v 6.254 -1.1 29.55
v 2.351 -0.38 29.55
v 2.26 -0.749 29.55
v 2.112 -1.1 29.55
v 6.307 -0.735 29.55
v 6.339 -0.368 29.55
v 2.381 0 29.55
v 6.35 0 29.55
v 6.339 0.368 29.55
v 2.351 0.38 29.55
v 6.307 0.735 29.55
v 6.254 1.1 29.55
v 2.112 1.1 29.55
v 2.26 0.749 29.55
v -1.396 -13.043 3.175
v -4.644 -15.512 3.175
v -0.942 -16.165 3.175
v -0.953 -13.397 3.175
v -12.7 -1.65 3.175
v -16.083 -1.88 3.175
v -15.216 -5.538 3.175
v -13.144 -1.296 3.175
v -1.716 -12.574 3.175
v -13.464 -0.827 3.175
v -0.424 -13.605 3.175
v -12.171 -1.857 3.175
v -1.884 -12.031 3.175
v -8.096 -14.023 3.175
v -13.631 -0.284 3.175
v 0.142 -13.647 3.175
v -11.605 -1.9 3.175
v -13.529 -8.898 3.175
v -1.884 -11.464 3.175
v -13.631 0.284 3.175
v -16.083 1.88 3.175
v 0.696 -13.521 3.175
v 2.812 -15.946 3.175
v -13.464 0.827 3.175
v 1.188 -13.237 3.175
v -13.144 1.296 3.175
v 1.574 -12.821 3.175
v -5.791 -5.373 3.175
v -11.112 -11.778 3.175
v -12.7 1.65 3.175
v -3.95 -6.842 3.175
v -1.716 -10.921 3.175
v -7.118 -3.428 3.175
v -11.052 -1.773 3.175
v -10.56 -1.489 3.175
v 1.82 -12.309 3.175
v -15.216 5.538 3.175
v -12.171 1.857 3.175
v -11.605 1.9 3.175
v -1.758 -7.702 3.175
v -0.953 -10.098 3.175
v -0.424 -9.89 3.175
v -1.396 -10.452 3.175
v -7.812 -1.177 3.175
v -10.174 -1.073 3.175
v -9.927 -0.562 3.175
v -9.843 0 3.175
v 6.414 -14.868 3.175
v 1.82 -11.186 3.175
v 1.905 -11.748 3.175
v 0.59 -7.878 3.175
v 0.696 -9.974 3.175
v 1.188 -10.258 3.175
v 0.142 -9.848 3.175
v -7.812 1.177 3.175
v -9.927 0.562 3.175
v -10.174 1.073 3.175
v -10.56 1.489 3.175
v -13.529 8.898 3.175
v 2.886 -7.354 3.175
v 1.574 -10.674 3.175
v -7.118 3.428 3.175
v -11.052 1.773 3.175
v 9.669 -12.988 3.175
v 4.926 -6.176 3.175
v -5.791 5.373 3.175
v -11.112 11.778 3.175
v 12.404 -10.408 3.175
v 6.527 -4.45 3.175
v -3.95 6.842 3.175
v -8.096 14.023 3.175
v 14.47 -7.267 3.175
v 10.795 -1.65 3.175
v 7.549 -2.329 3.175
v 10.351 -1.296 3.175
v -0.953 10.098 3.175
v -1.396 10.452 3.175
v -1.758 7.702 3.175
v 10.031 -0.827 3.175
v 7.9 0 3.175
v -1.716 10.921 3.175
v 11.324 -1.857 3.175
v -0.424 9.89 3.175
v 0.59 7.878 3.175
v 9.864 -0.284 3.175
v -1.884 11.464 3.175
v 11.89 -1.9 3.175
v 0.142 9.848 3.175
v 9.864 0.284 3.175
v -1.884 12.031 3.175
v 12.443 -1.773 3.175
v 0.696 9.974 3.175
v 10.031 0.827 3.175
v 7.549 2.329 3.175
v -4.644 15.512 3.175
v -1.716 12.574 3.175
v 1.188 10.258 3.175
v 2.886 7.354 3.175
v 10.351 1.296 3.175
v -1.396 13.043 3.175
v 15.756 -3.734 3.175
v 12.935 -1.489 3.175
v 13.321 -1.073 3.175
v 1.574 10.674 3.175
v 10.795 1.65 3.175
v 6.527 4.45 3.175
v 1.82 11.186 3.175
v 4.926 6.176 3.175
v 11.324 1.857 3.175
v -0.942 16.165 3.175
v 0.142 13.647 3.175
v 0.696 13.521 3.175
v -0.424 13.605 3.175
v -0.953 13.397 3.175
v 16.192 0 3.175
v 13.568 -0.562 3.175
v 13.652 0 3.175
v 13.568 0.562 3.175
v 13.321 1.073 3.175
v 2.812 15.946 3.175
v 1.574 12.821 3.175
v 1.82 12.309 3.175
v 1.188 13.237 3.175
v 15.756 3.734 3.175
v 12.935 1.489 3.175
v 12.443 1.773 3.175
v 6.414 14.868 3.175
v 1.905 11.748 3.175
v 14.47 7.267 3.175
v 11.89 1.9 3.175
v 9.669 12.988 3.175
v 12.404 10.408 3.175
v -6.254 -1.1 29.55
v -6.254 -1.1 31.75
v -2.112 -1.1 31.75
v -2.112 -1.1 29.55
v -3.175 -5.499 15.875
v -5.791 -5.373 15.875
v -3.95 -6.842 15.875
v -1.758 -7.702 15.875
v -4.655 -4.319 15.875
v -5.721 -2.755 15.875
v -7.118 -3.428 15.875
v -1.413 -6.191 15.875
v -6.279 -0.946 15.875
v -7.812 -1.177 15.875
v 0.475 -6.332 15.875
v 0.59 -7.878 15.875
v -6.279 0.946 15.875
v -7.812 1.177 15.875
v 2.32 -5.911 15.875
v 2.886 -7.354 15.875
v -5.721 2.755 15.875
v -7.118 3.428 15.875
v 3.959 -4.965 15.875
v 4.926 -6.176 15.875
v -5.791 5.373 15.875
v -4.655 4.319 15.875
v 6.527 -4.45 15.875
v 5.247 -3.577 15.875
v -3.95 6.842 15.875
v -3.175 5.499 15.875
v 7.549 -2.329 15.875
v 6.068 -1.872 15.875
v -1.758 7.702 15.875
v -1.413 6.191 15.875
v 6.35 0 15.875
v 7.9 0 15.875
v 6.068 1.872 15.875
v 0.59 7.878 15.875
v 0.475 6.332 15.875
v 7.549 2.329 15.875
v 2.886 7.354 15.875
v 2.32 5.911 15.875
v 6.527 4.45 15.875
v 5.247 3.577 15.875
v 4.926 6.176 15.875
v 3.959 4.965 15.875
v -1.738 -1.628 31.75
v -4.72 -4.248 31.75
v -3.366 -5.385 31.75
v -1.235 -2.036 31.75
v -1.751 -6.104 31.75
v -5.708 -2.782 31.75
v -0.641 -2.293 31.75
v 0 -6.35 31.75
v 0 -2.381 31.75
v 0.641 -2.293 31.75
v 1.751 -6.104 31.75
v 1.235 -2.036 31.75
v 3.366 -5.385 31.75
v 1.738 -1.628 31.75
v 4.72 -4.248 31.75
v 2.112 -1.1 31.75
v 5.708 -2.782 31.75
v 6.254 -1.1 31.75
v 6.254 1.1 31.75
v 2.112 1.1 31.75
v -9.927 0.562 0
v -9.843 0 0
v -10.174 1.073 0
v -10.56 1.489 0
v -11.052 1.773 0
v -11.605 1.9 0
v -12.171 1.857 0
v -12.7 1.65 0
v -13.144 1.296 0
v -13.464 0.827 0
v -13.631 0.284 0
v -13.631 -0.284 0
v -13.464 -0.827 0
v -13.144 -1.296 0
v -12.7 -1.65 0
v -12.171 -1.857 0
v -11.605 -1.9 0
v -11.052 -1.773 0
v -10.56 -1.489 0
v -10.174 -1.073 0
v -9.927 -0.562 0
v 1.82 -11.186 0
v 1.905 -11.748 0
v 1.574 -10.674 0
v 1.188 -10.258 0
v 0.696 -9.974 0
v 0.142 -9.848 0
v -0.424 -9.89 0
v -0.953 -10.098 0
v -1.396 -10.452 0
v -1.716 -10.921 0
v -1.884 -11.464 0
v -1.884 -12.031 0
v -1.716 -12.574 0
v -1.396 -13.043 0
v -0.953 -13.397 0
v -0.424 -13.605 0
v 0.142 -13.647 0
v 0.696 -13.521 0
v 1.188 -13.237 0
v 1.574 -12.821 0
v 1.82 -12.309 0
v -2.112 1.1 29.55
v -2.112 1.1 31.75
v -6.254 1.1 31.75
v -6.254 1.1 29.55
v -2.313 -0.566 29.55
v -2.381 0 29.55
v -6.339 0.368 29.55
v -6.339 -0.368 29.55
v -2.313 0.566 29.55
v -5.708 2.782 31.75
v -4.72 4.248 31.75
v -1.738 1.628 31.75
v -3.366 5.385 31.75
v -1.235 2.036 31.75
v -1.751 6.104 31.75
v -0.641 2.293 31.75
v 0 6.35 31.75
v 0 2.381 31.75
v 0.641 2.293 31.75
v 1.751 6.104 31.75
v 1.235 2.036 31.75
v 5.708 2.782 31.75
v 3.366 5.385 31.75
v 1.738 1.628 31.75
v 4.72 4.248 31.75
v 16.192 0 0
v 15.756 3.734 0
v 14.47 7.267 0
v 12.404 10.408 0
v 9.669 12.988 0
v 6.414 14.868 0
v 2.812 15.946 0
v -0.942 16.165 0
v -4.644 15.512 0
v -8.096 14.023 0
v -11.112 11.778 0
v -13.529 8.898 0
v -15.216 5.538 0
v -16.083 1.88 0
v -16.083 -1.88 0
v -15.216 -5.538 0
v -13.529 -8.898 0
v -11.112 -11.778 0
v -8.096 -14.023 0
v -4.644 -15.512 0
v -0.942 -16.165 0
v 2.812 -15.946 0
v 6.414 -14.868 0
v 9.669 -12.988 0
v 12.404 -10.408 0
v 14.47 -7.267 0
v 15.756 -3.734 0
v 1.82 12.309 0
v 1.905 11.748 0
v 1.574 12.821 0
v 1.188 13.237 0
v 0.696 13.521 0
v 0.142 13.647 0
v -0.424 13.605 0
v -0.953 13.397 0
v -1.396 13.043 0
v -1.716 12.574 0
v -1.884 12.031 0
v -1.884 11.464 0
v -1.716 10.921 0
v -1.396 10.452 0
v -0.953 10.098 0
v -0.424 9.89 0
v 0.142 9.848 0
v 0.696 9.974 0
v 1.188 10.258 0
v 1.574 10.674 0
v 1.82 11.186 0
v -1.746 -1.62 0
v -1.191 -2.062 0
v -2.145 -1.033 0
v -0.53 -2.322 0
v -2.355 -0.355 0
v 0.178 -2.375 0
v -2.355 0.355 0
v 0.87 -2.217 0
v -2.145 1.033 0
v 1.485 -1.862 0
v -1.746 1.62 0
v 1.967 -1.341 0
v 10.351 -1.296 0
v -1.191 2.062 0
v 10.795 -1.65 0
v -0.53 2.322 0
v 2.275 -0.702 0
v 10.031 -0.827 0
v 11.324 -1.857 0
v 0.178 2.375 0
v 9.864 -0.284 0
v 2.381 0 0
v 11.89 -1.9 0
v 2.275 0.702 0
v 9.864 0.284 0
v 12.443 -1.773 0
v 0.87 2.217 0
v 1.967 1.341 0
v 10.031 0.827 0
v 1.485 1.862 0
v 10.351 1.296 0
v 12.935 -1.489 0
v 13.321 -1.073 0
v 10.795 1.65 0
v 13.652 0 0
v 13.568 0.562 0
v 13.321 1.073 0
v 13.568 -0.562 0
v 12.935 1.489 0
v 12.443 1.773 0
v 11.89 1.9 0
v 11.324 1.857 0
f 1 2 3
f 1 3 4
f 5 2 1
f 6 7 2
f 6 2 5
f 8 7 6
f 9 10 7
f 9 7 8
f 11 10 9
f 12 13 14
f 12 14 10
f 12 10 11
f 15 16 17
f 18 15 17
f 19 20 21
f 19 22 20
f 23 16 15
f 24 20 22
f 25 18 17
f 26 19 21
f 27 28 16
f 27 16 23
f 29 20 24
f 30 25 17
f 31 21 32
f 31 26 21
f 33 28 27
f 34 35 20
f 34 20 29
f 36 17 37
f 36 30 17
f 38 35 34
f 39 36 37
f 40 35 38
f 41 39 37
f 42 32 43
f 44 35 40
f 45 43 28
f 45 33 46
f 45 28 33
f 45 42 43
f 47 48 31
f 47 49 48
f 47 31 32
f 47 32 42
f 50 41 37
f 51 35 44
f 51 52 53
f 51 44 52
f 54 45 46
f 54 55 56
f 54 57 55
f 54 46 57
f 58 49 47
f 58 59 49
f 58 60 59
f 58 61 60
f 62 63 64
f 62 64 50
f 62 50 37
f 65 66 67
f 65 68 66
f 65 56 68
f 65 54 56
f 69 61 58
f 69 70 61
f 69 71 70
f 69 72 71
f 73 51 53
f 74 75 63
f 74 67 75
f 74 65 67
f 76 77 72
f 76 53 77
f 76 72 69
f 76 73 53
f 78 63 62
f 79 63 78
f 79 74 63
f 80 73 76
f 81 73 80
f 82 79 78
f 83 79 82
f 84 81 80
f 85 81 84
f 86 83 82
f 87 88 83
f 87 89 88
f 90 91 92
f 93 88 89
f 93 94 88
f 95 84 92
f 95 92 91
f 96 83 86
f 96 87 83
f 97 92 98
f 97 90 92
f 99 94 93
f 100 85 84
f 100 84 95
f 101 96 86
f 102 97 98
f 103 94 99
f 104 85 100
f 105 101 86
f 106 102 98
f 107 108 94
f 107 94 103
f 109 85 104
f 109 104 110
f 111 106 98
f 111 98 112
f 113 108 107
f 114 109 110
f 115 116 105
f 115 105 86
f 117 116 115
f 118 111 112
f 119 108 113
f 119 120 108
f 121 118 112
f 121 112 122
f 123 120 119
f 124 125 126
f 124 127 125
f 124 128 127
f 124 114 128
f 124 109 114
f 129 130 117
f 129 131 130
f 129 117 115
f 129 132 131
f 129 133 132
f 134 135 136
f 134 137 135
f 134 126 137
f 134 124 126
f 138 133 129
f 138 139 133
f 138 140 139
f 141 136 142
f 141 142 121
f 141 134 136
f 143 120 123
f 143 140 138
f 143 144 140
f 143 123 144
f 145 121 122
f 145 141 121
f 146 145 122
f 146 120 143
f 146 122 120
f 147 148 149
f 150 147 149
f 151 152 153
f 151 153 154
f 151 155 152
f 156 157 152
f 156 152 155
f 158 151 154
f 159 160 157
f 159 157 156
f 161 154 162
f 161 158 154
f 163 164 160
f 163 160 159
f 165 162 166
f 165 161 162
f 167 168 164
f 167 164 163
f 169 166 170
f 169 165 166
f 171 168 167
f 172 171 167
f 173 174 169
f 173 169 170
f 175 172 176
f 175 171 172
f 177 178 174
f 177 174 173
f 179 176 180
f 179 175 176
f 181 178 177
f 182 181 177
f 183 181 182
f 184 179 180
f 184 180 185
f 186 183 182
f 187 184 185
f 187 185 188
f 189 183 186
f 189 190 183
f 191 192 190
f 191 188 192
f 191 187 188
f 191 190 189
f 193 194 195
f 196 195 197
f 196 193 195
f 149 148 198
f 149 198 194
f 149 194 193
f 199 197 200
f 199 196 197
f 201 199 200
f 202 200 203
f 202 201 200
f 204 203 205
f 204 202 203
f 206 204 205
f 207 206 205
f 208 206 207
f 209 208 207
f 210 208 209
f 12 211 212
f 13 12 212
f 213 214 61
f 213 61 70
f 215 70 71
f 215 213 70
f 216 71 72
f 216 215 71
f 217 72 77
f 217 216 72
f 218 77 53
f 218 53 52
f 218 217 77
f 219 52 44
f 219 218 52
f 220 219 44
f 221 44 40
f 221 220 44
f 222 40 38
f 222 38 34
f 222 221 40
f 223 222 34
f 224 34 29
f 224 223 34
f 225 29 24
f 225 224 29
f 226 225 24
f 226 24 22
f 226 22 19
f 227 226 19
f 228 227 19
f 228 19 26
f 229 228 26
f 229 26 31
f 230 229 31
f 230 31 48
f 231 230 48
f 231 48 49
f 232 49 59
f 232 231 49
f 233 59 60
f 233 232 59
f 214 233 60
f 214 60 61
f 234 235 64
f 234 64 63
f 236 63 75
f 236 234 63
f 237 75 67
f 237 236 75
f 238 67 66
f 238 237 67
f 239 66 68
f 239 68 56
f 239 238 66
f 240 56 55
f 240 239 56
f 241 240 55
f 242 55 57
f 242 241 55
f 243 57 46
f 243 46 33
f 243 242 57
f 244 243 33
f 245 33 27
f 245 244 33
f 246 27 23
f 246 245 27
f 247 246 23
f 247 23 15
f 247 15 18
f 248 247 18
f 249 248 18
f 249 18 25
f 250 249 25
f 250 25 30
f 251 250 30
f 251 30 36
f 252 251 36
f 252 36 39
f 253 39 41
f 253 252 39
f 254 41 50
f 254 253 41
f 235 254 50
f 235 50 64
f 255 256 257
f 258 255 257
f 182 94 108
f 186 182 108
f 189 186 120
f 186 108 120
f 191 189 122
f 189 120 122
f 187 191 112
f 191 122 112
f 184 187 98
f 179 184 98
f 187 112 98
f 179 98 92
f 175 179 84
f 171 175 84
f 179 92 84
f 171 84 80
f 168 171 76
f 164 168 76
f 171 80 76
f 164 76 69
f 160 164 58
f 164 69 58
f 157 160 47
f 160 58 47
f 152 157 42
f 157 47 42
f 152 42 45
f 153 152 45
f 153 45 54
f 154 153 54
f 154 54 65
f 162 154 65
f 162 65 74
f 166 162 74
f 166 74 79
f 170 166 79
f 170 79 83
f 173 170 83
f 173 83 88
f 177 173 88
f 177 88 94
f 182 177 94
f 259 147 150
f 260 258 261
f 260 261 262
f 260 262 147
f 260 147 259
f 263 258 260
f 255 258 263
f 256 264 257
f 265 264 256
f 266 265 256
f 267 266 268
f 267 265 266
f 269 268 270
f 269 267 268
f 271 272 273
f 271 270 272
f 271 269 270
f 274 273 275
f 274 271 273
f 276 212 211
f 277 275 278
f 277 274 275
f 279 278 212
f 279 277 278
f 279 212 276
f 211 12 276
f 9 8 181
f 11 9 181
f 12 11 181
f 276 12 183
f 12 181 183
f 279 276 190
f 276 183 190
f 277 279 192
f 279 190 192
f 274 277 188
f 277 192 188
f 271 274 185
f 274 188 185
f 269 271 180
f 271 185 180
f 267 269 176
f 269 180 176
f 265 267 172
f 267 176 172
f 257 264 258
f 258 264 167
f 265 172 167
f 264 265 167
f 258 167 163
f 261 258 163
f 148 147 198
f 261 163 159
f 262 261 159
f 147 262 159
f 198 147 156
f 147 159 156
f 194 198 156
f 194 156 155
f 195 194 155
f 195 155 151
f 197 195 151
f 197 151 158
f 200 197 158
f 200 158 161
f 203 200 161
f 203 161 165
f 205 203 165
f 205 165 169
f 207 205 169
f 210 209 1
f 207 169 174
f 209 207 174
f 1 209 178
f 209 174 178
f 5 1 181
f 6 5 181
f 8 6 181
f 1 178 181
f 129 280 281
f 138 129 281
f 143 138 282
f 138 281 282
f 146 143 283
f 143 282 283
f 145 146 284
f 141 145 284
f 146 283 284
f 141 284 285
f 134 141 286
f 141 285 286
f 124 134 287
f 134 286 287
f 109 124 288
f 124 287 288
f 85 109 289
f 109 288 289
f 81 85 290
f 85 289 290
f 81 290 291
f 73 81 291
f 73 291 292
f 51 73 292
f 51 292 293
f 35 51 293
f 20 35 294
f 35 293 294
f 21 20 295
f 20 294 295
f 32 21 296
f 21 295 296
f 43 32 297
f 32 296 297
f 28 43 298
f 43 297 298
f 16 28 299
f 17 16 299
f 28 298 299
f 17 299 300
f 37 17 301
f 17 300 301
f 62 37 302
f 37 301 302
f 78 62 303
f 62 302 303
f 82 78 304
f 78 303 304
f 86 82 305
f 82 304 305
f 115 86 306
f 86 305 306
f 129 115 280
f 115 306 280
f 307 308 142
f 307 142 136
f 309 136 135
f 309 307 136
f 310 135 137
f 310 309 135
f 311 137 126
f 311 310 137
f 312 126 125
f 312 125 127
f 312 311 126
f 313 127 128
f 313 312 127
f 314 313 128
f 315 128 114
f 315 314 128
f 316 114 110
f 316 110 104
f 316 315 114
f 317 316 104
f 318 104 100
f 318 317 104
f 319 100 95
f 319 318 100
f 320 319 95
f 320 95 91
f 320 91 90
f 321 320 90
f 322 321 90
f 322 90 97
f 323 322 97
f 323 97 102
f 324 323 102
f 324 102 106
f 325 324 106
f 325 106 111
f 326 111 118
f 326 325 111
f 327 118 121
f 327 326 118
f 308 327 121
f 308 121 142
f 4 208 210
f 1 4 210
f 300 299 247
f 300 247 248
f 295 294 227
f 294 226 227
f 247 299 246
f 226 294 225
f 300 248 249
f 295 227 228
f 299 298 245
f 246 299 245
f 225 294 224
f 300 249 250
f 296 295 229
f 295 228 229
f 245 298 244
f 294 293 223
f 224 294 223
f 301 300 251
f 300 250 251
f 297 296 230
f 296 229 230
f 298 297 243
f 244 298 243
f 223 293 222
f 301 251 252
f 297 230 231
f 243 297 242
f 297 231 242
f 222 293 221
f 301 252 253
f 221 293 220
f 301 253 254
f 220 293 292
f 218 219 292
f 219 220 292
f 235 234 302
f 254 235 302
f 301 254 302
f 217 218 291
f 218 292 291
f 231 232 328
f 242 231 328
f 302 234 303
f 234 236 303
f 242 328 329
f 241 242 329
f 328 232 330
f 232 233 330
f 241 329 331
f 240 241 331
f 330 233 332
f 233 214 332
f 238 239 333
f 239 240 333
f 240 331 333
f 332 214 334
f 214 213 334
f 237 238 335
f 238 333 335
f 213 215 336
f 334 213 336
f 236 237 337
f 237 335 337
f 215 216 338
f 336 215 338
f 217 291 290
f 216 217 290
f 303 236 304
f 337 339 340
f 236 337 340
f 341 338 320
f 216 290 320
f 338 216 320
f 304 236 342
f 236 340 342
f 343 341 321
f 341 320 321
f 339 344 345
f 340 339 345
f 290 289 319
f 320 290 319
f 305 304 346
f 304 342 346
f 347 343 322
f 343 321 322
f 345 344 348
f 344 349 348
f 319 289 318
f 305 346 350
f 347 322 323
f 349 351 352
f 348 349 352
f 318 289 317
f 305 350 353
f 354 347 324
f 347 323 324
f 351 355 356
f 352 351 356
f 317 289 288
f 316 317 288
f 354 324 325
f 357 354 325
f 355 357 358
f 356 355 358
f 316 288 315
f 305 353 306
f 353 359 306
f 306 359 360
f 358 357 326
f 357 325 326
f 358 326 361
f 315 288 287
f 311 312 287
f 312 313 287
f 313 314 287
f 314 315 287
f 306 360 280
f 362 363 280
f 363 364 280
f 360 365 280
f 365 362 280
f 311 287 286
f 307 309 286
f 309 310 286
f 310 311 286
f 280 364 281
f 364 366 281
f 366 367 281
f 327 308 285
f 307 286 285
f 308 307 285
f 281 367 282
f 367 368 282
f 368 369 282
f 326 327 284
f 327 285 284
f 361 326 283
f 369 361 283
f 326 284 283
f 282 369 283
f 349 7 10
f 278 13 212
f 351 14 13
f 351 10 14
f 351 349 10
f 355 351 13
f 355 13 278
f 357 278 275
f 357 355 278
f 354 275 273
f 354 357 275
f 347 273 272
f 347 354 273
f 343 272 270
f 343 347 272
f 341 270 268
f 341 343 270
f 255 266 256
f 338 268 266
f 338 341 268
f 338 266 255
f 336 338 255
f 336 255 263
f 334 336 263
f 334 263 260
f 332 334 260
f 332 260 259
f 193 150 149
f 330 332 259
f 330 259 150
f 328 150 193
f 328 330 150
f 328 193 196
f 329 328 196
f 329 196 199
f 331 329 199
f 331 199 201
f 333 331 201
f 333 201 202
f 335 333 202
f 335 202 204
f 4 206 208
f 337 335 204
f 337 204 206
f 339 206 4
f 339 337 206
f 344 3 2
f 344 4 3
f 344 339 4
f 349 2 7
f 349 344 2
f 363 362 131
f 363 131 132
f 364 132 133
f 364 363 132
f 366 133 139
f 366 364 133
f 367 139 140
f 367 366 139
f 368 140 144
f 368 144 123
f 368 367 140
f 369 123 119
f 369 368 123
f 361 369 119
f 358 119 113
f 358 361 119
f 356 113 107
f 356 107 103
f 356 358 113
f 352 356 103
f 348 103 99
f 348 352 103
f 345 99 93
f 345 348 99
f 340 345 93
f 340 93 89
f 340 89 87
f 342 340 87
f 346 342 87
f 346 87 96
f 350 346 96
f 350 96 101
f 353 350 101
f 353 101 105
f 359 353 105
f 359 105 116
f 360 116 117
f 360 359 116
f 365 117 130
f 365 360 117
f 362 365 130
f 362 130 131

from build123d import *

# Parameters (mm, degrees)
F0_R     = 7.9
F0_R_2   = 6.35
F1_DEPTH = 15.875
F0_R_3   = 2.38125
F2_DEPTH = 31.75
F0_R_4   = 16.1925
F0_R_5   = 1.905
F4_DEPTH = 3.175
F6_DEPTH = 2.2


with BuildPart() as f1:
    # F0 (on Top) → F1 (new body)
    with BuildSketch(Plane.XY):
        Circle(F0_R)
        Circle(F0_R_2, mode=Mode.SUBTRACT)
    extrude(amount=F1_DEPTH)

    # F0 (on Top) → F2 (join)
    with BuildSketch(Plane.XY):
        Circle(F0_R_2)
        Circle(F0_R_3, mode=Mode.SUBTRACT)
    extrude(amount=F2_DEPTH)

    # F0 (on Top) → F4 (join)
    with BuildSketch(Plane.XY):
        Circle(F0_R_4)
        with Locations((0, -11.7475)):
            Circle(F0_R_5, mode=Mode.SUBTRACT)
        with Locations((-11.7475, 0)):
            Circle(F0_R_5, mode=Mode.SUBTRACT)
        Circle(F0_R, mode=Mode.SUBTRACT)
        with Locations((11.7475, 0)):
            Circle(F0_R_5, mode=Mode.SUBTRACT)
        with Locations((0, 11.7475)):
            Circle(F0_R_5, mode=Mode.SUBTRACT)
    extrude(amount=F4_DEPTH)

    # F5 (on face) → F6 (cut)
    with BuildSketch(Plane.XY.offset(31.75)):
        with BuildLine():
            ThreePointArc((6.35, 0), (6.3259541524, 0.5520906279), (6.2539987208, 1.1))
            Line((6.2539987208, 1.1), (2.1119544414, 1.1))
            ThreePointArc((2.1119544414, 1.1), (2.3129465057, 0.5662420193), (2.38125, 0))
            ThreePointArc((2.38125, 0), (2.3129465057, -0.5662420193), (2.1119544414, -1.1))
            Line((2.1119544414, -1.1), (6.2539987208, -1.1))
            ThreePointArc((6.2539987208, -1.1), (6.3259541524, -0.5520906279), (6.35, 0))
        make_face()
        with BuildLine():
            Line((-2.1119544414, 1.1), (-6.2539987208, 1.1))
            ThreePointArc((-6.2539987208, 1.1), (-6.35, 0), (-6.2539987208, -1.1))
            Line((-6.2539987208, -1.1), (-2.1119544414, -1.1))
            ThreePointArc((-2.1119544414, -1.1), (-2.38125, 0), (-2.1119544414, 1.1))
        make_face()
    extrude(amount=-F6_DEPTH, mode=Mode.SUBTRACT)


solid = f1.part
